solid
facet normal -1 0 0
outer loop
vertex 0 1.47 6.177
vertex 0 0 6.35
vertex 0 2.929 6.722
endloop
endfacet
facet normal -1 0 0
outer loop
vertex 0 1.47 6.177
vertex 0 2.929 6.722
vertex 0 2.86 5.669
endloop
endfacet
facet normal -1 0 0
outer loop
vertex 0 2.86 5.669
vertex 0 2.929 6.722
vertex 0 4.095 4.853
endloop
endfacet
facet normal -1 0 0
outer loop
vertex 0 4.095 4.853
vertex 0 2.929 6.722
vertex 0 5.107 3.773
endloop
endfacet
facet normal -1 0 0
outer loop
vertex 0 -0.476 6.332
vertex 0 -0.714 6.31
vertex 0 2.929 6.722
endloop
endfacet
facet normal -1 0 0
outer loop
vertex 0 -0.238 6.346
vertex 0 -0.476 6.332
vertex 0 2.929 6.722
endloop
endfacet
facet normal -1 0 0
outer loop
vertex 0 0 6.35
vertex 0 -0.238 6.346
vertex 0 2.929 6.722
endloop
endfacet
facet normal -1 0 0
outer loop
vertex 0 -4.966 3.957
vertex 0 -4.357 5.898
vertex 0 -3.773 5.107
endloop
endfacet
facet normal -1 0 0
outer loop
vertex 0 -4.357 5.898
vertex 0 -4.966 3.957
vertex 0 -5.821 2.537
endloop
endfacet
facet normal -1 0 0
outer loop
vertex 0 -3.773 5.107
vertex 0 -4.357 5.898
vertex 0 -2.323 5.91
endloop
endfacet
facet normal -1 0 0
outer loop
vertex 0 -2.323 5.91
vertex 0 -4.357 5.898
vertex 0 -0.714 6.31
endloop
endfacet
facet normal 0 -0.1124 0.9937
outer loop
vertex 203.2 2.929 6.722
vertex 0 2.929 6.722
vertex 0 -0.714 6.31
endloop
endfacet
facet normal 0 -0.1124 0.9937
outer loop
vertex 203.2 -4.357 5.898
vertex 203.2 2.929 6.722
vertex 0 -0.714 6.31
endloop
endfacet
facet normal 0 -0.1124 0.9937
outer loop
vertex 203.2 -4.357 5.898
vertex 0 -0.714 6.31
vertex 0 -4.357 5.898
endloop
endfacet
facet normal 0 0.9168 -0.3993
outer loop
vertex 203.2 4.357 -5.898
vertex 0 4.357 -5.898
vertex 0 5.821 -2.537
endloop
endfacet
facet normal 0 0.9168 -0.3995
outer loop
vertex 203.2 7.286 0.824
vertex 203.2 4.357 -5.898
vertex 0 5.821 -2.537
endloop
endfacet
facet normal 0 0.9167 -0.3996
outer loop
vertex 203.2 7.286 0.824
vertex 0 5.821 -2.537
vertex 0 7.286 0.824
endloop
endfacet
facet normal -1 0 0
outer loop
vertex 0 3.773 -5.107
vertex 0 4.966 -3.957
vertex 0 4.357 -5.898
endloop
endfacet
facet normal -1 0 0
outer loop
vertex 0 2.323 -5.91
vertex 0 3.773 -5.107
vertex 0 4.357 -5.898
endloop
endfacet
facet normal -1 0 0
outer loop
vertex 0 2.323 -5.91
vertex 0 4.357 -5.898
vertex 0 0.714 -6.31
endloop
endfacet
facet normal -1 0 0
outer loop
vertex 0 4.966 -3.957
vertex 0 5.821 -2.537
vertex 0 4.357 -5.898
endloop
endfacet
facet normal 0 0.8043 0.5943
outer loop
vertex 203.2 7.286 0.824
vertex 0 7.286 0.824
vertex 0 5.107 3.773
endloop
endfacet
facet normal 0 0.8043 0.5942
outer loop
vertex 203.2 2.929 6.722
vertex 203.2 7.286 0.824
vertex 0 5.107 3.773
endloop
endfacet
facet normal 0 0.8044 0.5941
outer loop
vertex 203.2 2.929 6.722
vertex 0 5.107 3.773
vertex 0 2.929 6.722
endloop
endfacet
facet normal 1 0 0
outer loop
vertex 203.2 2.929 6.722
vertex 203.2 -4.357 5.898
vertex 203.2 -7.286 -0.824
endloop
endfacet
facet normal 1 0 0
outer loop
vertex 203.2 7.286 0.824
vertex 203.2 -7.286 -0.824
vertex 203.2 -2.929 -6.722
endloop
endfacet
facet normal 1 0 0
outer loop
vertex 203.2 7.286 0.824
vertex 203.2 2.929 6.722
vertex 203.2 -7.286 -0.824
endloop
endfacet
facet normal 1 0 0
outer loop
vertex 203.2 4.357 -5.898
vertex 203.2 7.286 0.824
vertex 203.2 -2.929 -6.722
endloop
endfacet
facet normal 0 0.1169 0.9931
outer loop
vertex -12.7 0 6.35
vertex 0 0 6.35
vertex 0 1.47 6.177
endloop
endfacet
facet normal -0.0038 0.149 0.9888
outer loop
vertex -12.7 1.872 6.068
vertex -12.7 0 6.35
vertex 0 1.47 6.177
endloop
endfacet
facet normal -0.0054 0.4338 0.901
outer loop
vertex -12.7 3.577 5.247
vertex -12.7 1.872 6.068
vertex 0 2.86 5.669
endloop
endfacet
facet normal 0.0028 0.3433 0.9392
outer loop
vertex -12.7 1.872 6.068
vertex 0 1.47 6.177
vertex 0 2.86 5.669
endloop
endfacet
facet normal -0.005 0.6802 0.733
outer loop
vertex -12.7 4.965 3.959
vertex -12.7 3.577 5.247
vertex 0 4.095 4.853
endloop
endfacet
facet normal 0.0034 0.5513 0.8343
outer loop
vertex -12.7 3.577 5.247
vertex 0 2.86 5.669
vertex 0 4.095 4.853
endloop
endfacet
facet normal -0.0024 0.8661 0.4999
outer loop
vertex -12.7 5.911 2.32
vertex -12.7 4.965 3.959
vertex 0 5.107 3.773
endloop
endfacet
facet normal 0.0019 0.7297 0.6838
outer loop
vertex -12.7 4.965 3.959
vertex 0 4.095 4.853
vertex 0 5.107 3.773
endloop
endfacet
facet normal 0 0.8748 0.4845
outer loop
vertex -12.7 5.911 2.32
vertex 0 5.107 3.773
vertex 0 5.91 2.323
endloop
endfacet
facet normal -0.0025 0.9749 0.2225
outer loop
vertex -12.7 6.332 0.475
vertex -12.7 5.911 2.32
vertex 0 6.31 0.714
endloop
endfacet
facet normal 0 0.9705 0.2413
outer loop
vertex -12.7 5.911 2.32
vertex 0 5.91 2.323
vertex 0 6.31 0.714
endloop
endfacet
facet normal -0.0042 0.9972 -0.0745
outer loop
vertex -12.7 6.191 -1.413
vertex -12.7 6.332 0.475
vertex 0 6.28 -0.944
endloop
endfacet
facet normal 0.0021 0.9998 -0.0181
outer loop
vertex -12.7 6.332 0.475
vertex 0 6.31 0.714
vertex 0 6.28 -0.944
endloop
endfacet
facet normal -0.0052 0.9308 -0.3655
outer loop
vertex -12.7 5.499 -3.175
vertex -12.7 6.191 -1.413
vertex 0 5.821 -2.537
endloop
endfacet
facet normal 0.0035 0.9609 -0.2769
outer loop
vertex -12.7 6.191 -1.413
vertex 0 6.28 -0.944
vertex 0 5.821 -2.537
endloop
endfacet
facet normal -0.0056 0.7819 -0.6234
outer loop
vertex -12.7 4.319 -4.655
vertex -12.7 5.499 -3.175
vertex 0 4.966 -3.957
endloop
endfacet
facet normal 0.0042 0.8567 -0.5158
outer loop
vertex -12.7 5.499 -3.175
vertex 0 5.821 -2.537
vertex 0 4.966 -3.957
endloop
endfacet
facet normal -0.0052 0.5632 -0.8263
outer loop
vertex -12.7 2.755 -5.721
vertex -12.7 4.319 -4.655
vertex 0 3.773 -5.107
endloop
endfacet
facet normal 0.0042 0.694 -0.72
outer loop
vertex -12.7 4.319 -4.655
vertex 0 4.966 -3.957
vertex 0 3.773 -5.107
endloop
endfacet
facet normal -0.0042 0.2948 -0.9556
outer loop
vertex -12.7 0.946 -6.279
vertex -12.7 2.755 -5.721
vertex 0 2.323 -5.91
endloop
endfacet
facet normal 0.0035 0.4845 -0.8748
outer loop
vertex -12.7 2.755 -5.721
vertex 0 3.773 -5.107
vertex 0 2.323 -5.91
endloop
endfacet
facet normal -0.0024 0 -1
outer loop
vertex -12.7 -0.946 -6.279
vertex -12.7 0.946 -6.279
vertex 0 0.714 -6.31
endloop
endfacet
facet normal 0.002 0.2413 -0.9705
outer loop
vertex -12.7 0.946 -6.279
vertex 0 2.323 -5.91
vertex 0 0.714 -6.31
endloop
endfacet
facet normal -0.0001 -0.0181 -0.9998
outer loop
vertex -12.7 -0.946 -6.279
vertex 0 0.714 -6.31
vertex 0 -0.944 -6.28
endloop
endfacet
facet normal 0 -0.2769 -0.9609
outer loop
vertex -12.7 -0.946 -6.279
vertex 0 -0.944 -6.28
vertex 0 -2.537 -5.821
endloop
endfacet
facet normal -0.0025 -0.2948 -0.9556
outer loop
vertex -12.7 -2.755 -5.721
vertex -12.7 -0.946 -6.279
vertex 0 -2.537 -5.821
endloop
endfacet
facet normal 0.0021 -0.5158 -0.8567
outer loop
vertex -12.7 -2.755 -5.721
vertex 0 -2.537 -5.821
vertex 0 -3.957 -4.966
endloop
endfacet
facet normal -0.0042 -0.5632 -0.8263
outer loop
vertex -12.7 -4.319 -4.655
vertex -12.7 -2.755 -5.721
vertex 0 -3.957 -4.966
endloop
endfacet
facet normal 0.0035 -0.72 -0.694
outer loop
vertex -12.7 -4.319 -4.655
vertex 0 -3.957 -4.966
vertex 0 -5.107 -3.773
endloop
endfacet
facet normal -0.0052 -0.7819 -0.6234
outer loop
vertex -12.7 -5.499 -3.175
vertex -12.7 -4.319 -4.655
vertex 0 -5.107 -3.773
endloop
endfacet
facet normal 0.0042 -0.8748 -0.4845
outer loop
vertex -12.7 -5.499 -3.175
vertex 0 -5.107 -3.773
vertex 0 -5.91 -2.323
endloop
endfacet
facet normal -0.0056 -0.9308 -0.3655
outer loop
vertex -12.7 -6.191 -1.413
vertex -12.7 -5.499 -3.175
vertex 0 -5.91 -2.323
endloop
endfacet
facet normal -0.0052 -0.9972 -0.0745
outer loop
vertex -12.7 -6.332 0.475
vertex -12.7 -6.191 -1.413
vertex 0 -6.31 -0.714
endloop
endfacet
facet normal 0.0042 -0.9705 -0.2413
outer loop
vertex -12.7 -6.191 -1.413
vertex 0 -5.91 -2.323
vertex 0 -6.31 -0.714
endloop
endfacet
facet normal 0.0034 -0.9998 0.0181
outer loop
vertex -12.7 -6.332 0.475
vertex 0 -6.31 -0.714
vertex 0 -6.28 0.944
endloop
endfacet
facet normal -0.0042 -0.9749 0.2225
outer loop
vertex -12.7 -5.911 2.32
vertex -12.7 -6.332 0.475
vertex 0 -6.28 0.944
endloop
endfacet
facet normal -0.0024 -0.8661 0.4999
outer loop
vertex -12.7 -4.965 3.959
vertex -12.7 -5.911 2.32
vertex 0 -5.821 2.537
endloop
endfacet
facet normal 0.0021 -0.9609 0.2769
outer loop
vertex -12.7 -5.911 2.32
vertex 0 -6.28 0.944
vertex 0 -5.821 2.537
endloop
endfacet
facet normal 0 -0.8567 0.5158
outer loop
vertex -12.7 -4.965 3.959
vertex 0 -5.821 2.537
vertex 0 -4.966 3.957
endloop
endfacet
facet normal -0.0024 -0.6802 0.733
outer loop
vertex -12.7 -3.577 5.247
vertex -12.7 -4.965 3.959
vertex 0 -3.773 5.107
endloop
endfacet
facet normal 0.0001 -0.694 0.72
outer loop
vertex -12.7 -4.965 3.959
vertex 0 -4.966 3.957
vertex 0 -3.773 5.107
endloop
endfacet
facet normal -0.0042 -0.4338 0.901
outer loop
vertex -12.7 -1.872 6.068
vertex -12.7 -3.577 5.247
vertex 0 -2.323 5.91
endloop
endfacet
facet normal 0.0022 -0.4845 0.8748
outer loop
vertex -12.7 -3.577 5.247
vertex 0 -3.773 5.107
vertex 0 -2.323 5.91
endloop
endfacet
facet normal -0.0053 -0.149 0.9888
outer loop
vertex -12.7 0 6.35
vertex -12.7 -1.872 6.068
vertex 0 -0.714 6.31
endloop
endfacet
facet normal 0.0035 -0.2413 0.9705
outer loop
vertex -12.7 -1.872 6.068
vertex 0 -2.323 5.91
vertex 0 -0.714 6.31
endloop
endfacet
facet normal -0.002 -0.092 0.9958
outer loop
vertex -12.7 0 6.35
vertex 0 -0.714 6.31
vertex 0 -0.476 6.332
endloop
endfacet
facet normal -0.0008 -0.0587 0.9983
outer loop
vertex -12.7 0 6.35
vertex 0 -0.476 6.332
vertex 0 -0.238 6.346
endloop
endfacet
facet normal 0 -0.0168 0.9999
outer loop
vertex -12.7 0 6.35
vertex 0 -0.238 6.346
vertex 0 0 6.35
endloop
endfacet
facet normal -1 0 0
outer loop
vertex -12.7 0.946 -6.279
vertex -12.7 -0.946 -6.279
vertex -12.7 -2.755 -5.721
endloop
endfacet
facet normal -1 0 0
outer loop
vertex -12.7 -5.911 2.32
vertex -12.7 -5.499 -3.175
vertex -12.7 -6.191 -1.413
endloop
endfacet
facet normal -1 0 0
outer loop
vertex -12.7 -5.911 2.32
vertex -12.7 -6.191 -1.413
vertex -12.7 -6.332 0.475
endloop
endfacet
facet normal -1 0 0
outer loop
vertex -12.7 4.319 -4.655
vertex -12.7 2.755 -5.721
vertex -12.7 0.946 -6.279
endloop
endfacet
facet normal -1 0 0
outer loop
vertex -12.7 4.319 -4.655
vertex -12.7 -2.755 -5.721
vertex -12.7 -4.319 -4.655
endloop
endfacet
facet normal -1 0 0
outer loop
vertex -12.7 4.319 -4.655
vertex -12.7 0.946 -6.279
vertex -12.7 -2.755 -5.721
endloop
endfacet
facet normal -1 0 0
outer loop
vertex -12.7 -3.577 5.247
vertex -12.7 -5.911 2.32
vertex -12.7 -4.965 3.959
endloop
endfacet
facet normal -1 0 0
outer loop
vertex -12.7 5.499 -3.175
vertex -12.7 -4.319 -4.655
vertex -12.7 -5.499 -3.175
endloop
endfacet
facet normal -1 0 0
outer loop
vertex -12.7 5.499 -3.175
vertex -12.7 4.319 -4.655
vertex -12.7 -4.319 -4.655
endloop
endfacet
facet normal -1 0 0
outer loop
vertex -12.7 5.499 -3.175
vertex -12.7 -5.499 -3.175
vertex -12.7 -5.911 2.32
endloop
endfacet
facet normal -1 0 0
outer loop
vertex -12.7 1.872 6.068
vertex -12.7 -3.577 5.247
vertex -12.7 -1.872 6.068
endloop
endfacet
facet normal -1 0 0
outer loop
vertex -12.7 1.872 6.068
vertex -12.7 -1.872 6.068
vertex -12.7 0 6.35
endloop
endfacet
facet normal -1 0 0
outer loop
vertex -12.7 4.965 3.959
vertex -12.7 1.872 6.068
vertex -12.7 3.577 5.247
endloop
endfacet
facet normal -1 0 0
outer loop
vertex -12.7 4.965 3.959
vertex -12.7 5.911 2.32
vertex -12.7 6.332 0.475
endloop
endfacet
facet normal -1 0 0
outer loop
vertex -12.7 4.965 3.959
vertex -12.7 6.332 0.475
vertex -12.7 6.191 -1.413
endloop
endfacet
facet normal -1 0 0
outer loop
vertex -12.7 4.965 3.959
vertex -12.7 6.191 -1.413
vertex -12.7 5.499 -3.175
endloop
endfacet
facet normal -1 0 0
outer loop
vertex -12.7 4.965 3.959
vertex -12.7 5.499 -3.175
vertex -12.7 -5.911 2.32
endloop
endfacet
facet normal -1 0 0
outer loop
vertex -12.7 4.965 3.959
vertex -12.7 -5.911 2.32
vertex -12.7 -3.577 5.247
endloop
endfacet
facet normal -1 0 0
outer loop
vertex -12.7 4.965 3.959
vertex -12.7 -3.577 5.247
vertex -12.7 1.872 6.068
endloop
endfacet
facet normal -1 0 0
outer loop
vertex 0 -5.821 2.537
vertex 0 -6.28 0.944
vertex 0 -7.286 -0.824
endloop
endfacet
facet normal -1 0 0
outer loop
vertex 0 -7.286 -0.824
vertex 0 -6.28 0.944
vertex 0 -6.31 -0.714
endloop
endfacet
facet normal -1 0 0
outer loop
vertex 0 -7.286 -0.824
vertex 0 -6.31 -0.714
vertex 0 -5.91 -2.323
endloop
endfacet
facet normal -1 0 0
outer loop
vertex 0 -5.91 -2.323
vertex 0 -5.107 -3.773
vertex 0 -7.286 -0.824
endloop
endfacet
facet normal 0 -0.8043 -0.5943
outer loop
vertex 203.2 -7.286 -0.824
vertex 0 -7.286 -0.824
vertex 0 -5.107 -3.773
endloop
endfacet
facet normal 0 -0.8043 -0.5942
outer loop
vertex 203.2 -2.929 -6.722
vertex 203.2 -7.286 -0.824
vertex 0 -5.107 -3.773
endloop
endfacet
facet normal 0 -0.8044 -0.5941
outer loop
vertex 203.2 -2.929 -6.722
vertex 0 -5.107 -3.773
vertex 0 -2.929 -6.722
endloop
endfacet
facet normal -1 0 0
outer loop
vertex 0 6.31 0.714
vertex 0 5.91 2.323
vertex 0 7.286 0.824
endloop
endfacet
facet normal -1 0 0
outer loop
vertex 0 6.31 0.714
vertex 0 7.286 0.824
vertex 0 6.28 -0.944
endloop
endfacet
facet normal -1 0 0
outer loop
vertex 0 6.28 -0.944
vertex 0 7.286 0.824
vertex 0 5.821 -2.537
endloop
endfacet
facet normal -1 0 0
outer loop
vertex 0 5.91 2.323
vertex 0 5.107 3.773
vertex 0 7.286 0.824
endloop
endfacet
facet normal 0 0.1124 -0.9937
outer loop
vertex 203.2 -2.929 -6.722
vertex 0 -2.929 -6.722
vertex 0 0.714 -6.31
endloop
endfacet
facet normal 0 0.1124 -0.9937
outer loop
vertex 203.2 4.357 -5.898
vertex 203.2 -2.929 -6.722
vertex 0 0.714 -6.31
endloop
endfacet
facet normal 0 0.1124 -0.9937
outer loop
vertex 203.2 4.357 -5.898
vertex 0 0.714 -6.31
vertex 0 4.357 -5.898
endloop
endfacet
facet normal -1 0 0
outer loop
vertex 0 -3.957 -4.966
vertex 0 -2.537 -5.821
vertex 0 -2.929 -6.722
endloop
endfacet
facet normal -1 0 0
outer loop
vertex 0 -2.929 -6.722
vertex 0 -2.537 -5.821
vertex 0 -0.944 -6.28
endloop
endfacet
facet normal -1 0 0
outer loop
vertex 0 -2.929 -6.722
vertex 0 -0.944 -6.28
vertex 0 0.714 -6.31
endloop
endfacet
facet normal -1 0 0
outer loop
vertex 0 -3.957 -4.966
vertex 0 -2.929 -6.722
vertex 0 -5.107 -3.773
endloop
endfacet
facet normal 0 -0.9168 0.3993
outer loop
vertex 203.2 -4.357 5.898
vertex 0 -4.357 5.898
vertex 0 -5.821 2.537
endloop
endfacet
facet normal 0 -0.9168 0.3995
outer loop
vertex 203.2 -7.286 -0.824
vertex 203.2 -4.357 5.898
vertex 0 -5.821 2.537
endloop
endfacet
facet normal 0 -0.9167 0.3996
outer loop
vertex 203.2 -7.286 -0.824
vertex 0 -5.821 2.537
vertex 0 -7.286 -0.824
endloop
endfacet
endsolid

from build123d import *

# Parameters (mm, degrees)
BOSS_EXTRUDE1_DEPTH = 203.2
SKETCH2_R           = 6.35
BOSS_EXTRUDE2_DEPTH = 12.7


with BuildPart() as part:
    # Sketch1 → Boss-Extrude1 (new body)
    with BuildSketch(Plane(origin=(0, 0, 0), x_dir=(0, 0, -1), z_dir=(1, 0, 0))):
        Polygon((6.72189532, -2.929070951), (5.897597513, 4.356796634), (-0.824297807, 7.285867584), (-6.72189532, 2.929070951), (-5.897597513, -4.356796634), (0.824297807, -7.285867584), align=None)
    extrude(amount=BOSS_EXTRUDE1_DEPTH)

    # Sketch2 → Boss-Extrude2 (add)
    with BuildSketch(Plane.ZY):
        Circle(SKETCH2_R)
    extrude(amount=BOSS_EXTRUDE2_DEPTH)


solid = part.part
